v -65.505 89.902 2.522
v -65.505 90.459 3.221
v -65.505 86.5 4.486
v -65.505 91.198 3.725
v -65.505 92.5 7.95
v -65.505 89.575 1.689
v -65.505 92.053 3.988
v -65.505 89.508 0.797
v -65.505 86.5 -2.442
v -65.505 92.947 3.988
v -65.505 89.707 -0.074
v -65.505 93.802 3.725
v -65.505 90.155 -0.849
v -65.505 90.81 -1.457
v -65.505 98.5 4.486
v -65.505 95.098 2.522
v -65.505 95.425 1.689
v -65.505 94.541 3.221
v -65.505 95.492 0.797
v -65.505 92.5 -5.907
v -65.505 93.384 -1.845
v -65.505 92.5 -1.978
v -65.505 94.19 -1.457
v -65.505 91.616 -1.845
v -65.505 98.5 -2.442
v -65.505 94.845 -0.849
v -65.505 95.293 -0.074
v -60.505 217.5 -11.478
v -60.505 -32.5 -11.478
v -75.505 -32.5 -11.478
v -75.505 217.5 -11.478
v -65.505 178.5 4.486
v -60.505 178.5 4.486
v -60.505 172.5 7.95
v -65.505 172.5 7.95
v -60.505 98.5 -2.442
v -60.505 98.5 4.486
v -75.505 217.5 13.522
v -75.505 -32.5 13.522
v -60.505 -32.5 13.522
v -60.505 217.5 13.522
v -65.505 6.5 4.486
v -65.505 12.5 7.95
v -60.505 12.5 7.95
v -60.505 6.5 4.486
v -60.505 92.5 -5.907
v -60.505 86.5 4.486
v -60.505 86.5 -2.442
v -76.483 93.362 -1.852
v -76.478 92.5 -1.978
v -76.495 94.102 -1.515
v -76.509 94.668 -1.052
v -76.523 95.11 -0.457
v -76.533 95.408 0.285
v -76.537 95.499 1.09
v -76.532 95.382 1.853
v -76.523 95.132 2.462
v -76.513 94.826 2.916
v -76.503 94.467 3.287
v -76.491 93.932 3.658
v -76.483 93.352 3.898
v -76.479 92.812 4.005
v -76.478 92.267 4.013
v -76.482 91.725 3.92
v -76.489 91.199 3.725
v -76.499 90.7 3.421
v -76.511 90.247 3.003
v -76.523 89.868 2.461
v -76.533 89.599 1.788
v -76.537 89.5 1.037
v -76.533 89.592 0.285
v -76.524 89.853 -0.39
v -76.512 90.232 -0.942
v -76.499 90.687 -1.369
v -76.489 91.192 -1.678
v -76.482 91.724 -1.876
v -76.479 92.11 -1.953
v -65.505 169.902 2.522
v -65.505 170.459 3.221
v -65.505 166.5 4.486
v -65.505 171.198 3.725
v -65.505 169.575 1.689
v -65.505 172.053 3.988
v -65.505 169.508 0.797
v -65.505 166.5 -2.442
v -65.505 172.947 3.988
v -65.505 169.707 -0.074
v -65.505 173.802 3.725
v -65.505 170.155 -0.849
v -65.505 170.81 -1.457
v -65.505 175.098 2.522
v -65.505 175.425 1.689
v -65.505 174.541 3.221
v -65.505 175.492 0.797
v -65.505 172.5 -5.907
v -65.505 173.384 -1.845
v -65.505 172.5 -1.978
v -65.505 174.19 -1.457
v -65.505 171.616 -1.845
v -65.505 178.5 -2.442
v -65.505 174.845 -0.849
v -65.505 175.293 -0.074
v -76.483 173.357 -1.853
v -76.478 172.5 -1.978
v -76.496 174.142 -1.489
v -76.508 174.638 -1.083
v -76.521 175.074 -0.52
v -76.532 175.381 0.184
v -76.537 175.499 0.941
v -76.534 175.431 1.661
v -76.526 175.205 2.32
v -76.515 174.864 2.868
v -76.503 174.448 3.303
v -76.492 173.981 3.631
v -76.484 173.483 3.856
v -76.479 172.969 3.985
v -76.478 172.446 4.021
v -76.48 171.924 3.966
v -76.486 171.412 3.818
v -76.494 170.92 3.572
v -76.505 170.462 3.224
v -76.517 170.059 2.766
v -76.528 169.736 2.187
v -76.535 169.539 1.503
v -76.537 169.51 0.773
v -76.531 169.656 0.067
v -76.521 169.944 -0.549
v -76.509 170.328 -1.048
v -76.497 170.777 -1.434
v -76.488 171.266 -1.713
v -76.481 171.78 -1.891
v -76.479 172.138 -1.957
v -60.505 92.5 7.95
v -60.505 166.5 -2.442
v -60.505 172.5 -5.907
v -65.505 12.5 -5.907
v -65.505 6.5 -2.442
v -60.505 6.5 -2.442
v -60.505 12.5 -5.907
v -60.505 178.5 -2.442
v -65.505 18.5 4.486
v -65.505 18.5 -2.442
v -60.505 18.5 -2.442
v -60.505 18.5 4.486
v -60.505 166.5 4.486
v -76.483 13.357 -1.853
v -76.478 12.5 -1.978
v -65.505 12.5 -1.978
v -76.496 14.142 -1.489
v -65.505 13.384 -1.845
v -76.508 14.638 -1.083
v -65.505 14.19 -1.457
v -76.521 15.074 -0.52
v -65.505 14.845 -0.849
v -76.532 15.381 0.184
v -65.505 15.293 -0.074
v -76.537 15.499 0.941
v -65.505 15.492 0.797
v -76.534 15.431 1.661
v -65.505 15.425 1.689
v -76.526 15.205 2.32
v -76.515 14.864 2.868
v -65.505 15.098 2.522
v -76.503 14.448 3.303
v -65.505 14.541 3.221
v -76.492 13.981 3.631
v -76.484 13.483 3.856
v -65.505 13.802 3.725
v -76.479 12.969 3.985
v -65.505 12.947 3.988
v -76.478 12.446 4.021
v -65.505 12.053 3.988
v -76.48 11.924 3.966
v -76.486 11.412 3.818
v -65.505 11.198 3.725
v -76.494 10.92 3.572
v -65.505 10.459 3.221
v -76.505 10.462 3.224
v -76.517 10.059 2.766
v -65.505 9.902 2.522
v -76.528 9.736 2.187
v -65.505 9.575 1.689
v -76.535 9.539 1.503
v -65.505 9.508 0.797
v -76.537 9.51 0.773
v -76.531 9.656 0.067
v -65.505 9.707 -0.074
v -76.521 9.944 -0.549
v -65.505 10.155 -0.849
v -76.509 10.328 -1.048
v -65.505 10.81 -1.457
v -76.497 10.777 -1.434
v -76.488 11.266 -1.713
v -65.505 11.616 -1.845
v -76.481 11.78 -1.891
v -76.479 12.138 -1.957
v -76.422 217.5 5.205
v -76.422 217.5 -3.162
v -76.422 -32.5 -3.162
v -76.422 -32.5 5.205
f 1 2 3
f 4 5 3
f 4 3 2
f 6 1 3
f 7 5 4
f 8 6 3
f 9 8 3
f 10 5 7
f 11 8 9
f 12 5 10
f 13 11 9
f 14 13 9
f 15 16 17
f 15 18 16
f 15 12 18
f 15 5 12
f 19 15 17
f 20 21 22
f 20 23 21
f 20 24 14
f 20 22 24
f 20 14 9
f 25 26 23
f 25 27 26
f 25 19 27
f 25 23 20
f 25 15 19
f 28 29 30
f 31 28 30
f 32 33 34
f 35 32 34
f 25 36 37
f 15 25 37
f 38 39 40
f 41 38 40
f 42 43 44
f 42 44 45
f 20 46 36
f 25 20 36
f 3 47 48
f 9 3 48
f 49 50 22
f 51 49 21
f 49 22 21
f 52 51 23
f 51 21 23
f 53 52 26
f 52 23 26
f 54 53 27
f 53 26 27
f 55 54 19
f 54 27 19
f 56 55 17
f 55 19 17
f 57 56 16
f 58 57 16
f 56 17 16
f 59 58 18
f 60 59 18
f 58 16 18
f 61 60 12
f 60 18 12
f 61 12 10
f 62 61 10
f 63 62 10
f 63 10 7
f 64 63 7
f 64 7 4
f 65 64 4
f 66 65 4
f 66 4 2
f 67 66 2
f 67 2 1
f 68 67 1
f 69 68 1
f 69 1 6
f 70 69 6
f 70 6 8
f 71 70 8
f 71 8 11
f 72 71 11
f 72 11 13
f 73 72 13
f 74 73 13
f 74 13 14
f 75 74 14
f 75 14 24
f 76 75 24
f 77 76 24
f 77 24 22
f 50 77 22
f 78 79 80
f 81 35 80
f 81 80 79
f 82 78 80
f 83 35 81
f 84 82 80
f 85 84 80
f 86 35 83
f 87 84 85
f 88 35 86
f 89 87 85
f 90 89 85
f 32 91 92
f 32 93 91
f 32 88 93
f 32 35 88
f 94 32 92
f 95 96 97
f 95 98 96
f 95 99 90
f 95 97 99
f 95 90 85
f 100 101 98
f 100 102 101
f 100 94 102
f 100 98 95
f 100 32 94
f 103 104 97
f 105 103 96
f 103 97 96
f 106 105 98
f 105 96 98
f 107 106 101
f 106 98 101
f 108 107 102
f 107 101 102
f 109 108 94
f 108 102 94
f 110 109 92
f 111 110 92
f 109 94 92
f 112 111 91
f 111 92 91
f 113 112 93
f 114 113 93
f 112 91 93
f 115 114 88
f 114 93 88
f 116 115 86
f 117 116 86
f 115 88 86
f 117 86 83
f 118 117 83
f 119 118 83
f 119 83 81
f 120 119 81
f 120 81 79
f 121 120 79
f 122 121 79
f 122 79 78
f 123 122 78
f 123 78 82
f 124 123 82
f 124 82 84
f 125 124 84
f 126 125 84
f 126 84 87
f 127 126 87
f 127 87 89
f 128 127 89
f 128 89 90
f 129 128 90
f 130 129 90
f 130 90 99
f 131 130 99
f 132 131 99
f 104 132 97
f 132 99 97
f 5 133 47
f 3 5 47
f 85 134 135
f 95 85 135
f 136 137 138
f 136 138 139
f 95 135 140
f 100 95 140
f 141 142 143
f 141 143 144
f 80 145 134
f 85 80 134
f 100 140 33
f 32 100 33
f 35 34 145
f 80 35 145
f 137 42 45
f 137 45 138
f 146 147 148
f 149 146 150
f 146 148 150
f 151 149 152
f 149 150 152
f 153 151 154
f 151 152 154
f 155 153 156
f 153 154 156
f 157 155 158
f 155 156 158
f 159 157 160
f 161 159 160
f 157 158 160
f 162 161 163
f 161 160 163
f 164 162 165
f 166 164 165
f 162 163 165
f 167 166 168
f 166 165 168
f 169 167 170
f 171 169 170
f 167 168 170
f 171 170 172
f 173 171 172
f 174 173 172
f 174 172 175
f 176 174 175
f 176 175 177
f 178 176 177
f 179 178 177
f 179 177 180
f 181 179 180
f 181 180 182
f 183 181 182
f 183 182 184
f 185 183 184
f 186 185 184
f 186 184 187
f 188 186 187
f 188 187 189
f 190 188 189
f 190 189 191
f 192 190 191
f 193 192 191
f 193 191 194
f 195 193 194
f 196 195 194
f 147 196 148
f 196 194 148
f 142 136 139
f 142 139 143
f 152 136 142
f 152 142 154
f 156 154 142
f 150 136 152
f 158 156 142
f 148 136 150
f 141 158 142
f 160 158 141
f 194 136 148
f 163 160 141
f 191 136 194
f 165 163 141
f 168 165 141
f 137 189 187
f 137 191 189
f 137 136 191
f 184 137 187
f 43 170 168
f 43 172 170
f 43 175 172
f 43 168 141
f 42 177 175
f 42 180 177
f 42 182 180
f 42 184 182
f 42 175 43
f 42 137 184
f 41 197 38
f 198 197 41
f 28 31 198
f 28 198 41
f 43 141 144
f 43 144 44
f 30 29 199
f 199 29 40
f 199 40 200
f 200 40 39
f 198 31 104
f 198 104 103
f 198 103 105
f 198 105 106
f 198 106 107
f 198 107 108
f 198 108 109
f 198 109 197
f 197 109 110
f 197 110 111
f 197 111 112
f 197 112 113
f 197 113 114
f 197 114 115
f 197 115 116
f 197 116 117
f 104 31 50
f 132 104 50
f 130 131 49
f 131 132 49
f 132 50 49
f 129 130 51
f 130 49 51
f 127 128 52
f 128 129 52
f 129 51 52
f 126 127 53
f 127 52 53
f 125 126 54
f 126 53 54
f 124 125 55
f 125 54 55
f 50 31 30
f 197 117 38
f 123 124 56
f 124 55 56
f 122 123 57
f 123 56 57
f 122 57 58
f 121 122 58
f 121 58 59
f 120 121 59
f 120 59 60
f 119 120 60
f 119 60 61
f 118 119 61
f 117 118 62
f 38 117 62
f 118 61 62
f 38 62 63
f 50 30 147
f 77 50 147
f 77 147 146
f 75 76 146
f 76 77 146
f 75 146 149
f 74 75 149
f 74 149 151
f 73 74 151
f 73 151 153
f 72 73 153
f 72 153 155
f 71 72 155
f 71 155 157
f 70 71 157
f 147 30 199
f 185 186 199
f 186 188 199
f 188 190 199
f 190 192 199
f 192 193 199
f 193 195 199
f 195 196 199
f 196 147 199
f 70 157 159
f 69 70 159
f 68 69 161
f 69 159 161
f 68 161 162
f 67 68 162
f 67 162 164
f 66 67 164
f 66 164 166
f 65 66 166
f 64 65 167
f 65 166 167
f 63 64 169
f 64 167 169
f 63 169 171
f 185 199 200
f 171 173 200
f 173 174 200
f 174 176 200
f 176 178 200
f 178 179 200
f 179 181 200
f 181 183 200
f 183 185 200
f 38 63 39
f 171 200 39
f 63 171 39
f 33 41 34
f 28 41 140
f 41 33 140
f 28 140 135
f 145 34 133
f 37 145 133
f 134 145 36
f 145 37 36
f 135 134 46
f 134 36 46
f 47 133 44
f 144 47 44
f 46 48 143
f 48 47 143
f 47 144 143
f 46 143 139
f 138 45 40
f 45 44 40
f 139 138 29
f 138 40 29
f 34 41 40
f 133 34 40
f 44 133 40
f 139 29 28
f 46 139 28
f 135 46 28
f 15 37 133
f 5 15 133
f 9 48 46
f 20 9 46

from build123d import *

# Parameters (mm, degrees)
BOSS_EXTRUDE1_DEPTH = 25
SKETCH2_R           = 3
CUT_EXTRUDE1_DEPTH  = 25
SKETCH3_W           = 25
SKETCH3_H           = 25
BOSS_EXTRUDE2_DEPTH = 5
BOSS_EXTRUDE3_DEPTH = 192.5
BOSS_EXTRUDE4_START = 32.5
BOSS_EXTRUDE4_DEPTH = 32.5
LPATTERN4_COUNT     = 3
LPATTERN4_PITCH     = 80
CUT_EXTRUDE2_DEPTH  = 5


with BuildPart() as part:
    # Sketch1 → Boss-Extrude1 (new body)
    with BuildSketch(Plane(origin=(0, 0, 0), x_dir=(1, 0, 0), z_dir=(0, 1, 0))):
        with BuildLine():
            Line((-65.504745346, 11.478381524), (-65.504745346, -13.521618476))
            Line((-65.504745346, -13.521618476), (-75.504745346, -13.521618476))
            ThreePointArc((-75.504745346, -13.521618476), (-76.536999603, -1.021618476), (-75.504745346, 11.478381524))
            Line((-75.504745346, 11.478381524), (-65.504745346, 11.478381524))
        make_face()
    extrude(amount=BOSS_EXTRUDE1_DEPTH)

    # Sketch2 → Cut-Extrude1 (cut)
    with BuildSketch(Plane(origin=(-65.504745346, 0, 0), x_dir=(0, 0, -1), z_dir=(1, 0, 0))):
        with Locations((-1.021618476, 12.5)):
            Circle(SKETCH2_R)
    cut_extrude1 = extrude(amount=-CUT_EXTRUDE1_DEPTH, mode=Mode.SUBTRACT)

    # Sketch3 → Boss-Extrude2 (add)
    with BuildSketch(Plane(origin=(-65.504745346, 0, 0), x_dir=(0, 0, -1), z_dir=(1, 0, 0))):
        with Locations((-1.021618476, 12.5)):
            Rectangle(SKETCH3_W, SKETCH3_H)
        Polygon((5.906584755, 12.5), (2.442483139, 18.5), (-4.485720091, 18.5), (-7.949821706, 12.5), (-4.485720091, 6.5), (2.442483139, 6.5), align=None, mode=Mode.SUBTRACT)
    extrude(amount=BOSS_EXTRUDE2_DEPTH)

    # Sketch4 → Boss-Extrude3 (add)
    with BuildSketch(Plane(origin=(0, 25, 0), x_dir=(1, 0, 0), z_dir=(0, 1, 0))):
        with BuildLine():
            Line((-75.504745346, -13.521618476), (-60.504745346, -13.521618476))
            Line((-60.504745346, -13.521618476), (-60.504745346, 11.478381524))
            Line((-60.504745346, 11.478381524), (-75.504745346, 11.478381524))
            ThreePointArc((-75.504745346, 11.478381524), (-76.536999603, -1.021618476), (-75.504745346, -13.521618476))
        make_face()
    extrude(amount=BOSS_EXTRUDE3_DEPTH)

    # Sketch5 → Boss-Extrude4 (add)
    with BuildSketch(Plane.XZ.offset(BOSS_EXTRUDE4_START)):
        with BuildLine():
            Line((-75.504745346, 13.521618476), (-60.504745346, 13.521618476))
            Line((-60.504745346, 13.521618476), (-60.504745346, -11.478381524))
            Line((-60.504745346, -11.478381524), (-75.504745346, -11.478381524))
            ThreePointArc((-75.504745346, -11.478381524), (-76.536999603, 1.021618476), (-75.504745346, 13.521618476))
        make_face()
    extrude(amount=-BOSS_EXTRUDE4_DEPTH)

    # LPattern4: Cut-Extrude1 ×3
    with Locations(*[(0, i * LPATTERN4_PITCH, 0) for i in range(1, LPATTERN4_COUNT)]):
        add(cut_extrude1, mode=Mode.SUBTRACT)

    # Sketch6 → Cut-Extrude2 (cut)
    with BuildSketch(Plane(origin=(-60.504745346, 0, 0), x_dir=(0, 0, -1), z_dir=(1, 0, 0))):
        Polygon((5.906584755, 92.5), (2.442483139, 98.5), (-4.485720091, 98.5), (-7.949821706, 92.5), (-4.485720091, 86.5), (2.442483139, 86.5), align=None)
        Polygon((5.906584755, 172.5), (2.442483139, 178.5), (-4.485720091, 178.5), (-7.949821706, 172.5), (-4.485720091, 166.5), (2.442483139, 166.5), align=None)
    extrude(amount=-CUT_EXTRUDE2_DEPTH, mode=Mode.SUBTRACT)


solid = part.part
